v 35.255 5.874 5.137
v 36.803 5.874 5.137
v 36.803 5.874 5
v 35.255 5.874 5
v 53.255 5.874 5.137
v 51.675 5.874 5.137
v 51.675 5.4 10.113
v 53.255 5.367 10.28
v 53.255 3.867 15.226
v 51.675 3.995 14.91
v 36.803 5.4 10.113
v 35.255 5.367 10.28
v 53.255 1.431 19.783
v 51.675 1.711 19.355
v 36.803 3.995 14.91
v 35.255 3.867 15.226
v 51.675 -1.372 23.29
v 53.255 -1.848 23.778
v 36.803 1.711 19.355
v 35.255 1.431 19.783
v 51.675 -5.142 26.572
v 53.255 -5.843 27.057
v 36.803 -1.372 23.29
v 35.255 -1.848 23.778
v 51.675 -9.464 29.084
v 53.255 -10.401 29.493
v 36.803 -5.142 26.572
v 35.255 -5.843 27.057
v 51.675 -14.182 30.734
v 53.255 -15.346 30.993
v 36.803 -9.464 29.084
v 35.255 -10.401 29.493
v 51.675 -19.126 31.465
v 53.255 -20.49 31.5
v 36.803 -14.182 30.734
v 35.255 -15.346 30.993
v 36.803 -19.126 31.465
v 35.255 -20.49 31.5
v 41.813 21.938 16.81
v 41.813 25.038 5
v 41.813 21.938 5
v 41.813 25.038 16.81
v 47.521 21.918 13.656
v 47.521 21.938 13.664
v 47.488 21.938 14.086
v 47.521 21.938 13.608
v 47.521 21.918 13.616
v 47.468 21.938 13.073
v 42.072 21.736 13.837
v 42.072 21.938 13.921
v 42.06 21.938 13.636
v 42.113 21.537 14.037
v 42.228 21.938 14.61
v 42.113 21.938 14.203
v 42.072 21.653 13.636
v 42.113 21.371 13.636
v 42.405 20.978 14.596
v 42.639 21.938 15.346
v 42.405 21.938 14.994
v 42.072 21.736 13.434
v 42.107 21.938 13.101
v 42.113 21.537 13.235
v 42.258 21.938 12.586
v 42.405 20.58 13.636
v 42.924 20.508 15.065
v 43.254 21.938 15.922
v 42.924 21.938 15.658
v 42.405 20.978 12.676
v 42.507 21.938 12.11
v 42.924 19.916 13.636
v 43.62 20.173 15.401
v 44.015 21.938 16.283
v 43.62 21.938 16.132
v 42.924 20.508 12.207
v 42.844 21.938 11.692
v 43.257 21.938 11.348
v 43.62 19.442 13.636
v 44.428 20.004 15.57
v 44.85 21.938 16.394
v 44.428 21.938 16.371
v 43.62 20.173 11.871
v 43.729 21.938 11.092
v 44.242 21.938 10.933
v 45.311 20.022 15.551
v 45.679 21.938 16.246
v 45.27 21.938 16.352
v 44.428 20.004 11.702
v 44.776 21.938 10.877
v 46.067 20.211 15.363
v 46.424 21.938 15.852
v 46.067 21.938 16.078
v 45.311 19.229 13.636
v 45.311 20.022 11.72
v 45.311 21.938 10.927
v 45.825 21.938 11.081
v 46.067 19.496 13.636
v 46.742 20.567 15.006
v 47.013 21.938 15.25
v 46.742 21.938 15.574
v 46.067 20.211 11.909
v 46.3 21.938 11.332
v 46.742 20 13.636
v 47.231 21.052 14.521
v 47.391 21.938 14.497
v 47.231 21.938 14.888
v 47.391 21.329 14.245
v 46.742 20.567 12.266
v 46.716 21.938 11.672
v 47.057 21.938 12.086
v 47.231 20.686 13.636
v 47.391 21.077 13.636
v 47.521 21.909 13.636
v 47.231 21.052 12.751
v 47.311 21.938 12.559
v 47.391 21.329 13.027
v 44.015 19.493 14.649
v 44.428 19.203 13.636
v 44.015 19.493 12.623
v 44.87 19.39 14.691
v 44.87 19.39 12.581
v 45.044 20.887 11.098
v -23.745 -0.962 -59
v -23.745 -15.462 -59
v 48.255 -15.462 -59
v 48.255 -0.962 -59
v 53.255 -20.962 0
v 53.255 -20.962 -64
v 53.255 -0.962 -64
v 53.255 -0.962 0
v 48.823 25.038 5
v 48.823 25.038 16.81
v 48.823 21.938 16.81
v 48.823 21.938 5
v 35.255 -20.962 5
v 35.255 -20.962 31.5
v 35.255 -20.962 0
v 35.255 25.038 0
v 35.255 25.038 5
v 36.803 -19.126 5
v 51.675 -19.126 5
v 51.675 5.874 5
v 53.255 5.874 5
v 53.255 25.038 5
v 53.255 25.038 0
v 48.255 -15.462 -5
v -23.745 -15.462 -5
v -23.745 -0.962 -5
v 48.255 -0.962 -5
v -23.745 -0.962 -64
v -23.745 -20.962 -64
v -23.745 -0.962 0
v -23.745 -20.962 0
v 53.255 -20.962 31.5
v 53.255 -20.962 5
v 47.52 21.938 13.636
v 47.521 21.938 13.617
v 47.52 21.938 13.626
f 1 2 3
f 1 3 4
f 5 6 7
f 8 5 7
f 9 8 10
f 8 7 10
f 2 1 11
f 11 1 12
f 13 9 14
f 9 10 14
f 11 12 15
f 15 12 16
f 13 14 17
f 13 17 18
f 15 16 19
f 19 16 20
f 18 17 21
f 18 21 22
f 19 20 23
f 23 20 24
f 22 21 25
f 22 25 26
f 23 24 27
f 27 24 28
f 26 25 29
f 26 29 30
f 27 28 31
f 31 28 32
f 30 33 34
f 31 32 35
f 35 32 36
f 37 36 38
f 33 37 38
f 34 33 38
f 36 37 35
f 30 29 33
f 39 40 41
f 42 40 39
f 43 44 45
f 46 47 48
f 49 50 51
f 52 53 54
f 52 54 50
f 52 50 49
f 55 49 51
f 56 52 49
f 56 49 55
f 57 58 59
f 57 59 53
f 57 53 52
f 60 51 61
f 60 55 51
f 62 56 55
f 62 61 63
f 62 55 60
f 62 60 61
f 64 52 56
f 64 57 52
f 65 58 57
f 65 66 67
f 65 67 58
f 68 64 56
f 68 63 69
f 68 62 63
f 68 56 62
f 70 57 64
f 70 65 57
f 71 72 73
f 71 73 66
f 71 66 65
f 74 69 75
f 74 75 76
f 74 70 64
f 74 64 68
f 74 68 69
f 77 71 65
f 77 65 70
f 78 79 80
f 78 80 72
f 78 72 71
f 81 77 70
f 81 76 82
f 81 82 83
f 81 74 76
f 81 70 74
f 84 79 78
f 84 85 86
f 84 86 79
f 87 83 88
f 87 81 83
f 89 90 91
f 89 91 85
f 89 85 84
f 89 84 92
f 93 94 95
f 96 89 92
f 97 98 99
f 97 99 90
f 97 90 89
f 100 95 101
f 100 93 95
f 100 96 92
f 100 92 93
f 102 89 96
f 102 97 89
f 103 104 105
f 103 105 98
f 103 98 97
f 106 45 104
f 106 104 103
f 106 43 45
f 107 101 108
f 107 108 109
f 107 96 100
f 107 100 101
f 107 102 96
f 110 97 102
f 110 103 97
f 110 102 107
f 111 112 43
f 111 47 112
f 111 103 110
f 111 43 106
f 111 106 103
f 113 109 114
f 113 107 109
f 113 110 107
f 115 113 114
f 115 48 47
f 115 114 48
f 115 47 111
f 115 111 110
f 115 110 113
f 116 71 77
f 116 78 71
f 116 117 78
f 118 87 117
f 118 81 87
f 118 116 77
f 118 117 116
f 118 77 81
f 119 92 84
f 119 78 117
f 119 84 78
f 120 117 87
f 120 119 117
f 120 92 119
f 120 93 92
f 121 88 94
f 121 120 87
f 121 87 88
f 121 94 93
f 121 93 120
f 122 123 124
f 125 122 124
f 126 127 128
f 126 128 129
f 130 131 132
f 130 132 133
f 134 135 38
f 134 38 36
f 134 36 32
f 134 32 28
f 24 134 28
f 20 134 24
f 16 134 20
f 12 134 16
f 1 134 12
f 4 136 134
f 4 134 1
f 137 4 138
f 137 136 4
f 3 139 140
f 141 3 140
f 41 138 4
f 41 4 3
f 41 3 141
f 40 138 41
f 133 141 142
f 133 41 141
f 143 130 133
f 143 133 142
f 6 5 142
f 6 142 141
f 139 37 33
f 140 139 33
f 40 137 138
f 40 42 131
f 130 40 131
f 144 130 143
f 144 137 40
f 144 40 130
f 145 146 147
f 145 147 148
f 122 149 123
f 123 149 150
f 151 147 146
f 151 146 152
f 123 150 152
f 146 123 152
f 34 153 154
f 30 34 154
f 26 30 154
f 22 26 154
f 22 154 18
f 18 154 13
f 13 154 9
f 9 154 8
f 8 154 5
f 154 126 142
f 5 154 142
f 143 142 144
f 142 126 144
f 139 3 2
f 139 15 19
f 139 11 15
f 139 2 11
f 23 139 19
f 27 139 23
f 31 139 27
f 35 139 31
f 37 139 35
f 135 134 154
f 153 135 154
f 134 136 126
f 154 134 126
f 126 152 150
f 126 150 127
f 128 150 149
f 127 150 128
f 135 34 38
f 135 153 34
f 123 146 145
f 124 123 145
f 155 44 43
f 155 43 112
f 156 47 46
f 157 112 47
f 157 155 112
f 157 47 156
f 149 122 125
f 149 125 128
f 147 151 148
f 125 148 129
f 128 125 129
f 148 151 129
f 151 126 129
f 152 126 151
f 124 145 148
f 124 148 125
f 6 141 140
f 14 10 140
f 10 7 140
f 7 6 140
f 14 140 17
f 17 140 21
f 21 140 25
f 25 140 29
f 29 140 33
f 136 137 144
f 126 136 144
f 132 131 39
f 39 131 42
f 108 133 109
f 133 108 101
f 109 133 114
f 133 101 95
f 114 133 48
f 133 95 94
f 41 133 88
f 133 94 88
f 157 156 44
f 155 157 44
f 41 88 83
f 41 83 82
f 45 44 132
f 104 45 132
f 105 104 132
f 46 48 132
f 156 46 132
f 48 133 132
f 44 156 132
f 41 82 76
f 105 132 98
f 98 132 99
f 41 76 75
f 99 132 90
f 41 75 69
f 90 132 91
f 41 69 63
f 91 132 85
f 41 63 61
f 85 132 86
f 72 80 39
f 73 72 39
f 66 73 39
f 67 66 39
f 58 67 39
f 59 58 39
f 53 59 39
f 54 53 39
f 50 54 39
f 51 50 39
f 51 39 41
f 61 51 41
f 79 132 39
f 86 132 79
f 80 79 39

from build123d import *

# Parameters (mm, degrees)
F0_W        = 18
F0_H        = 46
F1_DEPTH    = 5
F2_W        = 18
F2_H        = 1.8357727677
F3_DEPTH    = 26.5
F4_W        = 1.548052609
F4_H        = 26.5
F4_W_2      = 1.5802383423
F5_DEPTH    = 25
F6_T1_DEPTH = 133.3641131145
F6_T3_DEPTH = 133.3962988479
F7_W        = 7.0095323026
F7_H        = 2.1149524208
F7_H_2      = 11.8096721172
F8_DEPTH    = 3.1
F11_W       = 72
F11_H       = 5
F12_DEPTH   = 20
F11_H_2     = 54
F13_DEPTH   = 5.5


# Not quite as in the source:
# - a fillet or chamfer that OpenCascade refuses, or shapes differently, is made with other operations: its cross-section is extruded or revolved along the edge and cut away or added


with BuildPart() as f1:
    # F0 (on Top) → F1 (new body)
    with BuildSketch(Plane.XY):
        with Locations((44.2553941011, 2.0377691388)):
            Rectangle(F0_W, F0_H)
    extrude(amount=F1_DEPTH)

    # F2 (on face) → F3 (join)
    with BuildSketch(Plane.XY.offset(5)):
        with Locations((44.2553941011, -20.0443444774)):
            Rectangle(F2_W, F2_H)
    extrude(amount=F3_DEPTH)

    # F4 (on face) → F5 (join)
    with BuildSketch(Plane(origin=(0, -19.1264580935, 0), x_dir=(-1, 0, 0), z_dir=(0, 1, 0))):
        with Locations((-36.0294204056, 18.25)):
            Rectangle(F4_W, F4_H)
        with Locations((-52.46527493, 18.25)):
            Rectangle(F4_W_2, F4_H)
    extrude(amount=F5_DEPTH)

    # F6: fillet of radius 26.3632121011 on 2 edges, made by hand

    # F6_s2 → F6_t1 (cut)
    with BuildSketch(Plane.YZ.offset(-30.6526361516)):
        with BuildLine():
            ThreePointArc((5.8735419065, 5.1367878989), (-1.8480641441, 23.7783939494), (-20.4896701946, 31.5))
            Line((-20.4896701946, 31.5), (5.8735419065, 31.5))
            Line((5.8735419065, 31.5), (5.8735419065, 5.1367878989))
        make_face()
    extrude(amount=F6_T1_DEPTH, mode=Mode.SUBTRACT)

    # F6_s4 → F6_t3 (cut)
    with BuildSketch(Plane.YZ.offset(-14.2328744939)):
        with BuildLine():
            ThreePointArc((5.8735419065, 5.1367878989), (-1.8480641441, 23.7783939494), (-20.4896701946, 31.5))
            Line((-20.4896701946, 31.5), (5.8735419065, 31.5))
            Line((5.8735419065, 31.5), (5.8735419065, 5.1367878989))
        make_face()
    extrude(amount=F6_T3_DEPTH, mode=Mode.SUBTRACT)

    # F7 (on face) → F8 (join)
    with BuildSketch(Plane(origin=(0, 25.0377691388, 0), x_dir=(-1, 0, 0), z_dir=(0, 1, 0))):
        with Locations((-45.3178305179, 3.9425237896)):
            Rectangle(F7_W, F7_H)
        with Locations((-45.3178305179, 10.9048360586)):
            Rectangle(F7_W, F7_H_2)
    extrude(amount=-F8_DEPTH)

    # F9 (on face) → F10 (revolve)
    with BuildSketch(Plane.XZ.offset(-21.9377691388)):
        with BuildLine():
            ThreePointArc((42.0596776895, 13.6359646723), (44.7758231938, 10.8770558073), (47.5205518922, 13.6075299233))
            ThreePointArc((47.5205518922, 13.6075299233), (47.520514877, 13.6217474905), (47.5204038326, 13.6359646723))
            Line((47.5204038326, 13.6359646723), (42.0596776895, 13.6359646723))
        make_face()
    revolve(axis=Axis((44.790040761, 21.9377691388, 13.6359646723), (1, 0, 0)))


with BuildPart() as f12:
    # F11 (on face) → F12 (new body)
    with BuildSketch(Plane.XZ.offset(20.9622308612)):
        with Locations((12.2553941011, -61.5)):
            Rectangle(F11_W, F11_H)
        Polygon((53.2553941011, -64), (53.2553941011, -5), (48.2553941011, -5), (48.2553941011, -59), (48.2553941011, -64), align=None)
        Polygon((53.2553941011, -5), (53.2553941011, 0), (35.2553941011, 0), (-23.7446058989, 0), (-23.7446058989, -5), (48.2553941011, -5), align=None)
    extrude(amount=-F12_DEPTH)

    # F11 (on face) → F13 (join)
    with BuildSketch(Plane.XZ.offset(20.9622308612)):
        with Locations((12.2553941011, -32)):
            Rectangle(F11_W, F11_H_2)
    extrude(amount=-F13_DEPTH)


solid = Compound([f1.part, f12.part])
